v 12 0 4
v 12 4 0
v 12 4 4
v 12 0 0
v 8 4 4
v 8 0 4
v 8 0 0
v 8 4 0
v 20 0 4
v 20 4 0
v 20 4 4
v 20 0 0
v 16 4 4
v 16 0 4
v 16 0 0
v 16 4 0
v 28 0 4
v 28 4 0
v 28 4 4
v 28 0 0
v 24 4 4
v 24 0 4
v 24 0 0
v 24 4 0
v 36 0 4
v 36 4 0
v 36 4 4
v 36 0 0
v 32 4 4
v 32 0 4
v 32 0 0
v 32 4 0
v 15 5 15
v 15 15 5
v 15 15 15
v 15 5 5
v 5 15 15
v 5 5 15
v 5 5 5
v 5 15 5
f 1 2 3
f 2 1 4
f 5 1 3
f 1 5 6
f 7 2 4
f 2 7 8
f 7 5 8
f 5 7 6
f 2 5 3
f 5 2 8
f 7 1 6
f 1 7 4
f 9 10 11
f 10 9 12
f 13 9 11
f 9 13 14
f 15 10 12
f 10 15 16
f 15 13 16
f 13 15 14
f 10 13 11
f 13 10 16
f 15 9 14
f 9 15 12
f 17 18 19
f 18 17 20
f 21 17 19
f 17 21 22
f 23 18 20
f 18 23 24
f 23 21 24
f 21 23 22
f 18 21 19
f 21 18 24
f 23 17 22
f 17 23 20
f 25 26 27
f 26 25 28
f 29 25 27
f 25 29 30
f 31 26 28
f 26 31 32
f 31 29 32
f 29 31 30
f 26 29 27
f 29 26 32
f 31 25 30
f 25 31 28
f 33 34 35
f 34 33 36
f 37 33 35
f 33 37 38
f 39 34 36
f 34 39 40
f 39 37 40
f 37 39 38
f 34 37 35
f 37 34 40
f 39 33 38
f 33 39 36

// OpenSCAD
objects = 4; //[2, 4, 6]
side = 4; //[]
cube_pos = [5, 5, 5]; //[]
cube_size = 5; //[]
text = "customize me!"; //[customize me!, Thank you!]

union() {

	for (i = [1:objects]){
	    translate([2*i*side,0,0]){
	        cube(side);
	    }
	}
	translate(v = cube_pos) {
		cube(size = (cube_size * 2));
	}
	translate(v = [0, -20, 0]) {
		text(text = "text");
	}
}
